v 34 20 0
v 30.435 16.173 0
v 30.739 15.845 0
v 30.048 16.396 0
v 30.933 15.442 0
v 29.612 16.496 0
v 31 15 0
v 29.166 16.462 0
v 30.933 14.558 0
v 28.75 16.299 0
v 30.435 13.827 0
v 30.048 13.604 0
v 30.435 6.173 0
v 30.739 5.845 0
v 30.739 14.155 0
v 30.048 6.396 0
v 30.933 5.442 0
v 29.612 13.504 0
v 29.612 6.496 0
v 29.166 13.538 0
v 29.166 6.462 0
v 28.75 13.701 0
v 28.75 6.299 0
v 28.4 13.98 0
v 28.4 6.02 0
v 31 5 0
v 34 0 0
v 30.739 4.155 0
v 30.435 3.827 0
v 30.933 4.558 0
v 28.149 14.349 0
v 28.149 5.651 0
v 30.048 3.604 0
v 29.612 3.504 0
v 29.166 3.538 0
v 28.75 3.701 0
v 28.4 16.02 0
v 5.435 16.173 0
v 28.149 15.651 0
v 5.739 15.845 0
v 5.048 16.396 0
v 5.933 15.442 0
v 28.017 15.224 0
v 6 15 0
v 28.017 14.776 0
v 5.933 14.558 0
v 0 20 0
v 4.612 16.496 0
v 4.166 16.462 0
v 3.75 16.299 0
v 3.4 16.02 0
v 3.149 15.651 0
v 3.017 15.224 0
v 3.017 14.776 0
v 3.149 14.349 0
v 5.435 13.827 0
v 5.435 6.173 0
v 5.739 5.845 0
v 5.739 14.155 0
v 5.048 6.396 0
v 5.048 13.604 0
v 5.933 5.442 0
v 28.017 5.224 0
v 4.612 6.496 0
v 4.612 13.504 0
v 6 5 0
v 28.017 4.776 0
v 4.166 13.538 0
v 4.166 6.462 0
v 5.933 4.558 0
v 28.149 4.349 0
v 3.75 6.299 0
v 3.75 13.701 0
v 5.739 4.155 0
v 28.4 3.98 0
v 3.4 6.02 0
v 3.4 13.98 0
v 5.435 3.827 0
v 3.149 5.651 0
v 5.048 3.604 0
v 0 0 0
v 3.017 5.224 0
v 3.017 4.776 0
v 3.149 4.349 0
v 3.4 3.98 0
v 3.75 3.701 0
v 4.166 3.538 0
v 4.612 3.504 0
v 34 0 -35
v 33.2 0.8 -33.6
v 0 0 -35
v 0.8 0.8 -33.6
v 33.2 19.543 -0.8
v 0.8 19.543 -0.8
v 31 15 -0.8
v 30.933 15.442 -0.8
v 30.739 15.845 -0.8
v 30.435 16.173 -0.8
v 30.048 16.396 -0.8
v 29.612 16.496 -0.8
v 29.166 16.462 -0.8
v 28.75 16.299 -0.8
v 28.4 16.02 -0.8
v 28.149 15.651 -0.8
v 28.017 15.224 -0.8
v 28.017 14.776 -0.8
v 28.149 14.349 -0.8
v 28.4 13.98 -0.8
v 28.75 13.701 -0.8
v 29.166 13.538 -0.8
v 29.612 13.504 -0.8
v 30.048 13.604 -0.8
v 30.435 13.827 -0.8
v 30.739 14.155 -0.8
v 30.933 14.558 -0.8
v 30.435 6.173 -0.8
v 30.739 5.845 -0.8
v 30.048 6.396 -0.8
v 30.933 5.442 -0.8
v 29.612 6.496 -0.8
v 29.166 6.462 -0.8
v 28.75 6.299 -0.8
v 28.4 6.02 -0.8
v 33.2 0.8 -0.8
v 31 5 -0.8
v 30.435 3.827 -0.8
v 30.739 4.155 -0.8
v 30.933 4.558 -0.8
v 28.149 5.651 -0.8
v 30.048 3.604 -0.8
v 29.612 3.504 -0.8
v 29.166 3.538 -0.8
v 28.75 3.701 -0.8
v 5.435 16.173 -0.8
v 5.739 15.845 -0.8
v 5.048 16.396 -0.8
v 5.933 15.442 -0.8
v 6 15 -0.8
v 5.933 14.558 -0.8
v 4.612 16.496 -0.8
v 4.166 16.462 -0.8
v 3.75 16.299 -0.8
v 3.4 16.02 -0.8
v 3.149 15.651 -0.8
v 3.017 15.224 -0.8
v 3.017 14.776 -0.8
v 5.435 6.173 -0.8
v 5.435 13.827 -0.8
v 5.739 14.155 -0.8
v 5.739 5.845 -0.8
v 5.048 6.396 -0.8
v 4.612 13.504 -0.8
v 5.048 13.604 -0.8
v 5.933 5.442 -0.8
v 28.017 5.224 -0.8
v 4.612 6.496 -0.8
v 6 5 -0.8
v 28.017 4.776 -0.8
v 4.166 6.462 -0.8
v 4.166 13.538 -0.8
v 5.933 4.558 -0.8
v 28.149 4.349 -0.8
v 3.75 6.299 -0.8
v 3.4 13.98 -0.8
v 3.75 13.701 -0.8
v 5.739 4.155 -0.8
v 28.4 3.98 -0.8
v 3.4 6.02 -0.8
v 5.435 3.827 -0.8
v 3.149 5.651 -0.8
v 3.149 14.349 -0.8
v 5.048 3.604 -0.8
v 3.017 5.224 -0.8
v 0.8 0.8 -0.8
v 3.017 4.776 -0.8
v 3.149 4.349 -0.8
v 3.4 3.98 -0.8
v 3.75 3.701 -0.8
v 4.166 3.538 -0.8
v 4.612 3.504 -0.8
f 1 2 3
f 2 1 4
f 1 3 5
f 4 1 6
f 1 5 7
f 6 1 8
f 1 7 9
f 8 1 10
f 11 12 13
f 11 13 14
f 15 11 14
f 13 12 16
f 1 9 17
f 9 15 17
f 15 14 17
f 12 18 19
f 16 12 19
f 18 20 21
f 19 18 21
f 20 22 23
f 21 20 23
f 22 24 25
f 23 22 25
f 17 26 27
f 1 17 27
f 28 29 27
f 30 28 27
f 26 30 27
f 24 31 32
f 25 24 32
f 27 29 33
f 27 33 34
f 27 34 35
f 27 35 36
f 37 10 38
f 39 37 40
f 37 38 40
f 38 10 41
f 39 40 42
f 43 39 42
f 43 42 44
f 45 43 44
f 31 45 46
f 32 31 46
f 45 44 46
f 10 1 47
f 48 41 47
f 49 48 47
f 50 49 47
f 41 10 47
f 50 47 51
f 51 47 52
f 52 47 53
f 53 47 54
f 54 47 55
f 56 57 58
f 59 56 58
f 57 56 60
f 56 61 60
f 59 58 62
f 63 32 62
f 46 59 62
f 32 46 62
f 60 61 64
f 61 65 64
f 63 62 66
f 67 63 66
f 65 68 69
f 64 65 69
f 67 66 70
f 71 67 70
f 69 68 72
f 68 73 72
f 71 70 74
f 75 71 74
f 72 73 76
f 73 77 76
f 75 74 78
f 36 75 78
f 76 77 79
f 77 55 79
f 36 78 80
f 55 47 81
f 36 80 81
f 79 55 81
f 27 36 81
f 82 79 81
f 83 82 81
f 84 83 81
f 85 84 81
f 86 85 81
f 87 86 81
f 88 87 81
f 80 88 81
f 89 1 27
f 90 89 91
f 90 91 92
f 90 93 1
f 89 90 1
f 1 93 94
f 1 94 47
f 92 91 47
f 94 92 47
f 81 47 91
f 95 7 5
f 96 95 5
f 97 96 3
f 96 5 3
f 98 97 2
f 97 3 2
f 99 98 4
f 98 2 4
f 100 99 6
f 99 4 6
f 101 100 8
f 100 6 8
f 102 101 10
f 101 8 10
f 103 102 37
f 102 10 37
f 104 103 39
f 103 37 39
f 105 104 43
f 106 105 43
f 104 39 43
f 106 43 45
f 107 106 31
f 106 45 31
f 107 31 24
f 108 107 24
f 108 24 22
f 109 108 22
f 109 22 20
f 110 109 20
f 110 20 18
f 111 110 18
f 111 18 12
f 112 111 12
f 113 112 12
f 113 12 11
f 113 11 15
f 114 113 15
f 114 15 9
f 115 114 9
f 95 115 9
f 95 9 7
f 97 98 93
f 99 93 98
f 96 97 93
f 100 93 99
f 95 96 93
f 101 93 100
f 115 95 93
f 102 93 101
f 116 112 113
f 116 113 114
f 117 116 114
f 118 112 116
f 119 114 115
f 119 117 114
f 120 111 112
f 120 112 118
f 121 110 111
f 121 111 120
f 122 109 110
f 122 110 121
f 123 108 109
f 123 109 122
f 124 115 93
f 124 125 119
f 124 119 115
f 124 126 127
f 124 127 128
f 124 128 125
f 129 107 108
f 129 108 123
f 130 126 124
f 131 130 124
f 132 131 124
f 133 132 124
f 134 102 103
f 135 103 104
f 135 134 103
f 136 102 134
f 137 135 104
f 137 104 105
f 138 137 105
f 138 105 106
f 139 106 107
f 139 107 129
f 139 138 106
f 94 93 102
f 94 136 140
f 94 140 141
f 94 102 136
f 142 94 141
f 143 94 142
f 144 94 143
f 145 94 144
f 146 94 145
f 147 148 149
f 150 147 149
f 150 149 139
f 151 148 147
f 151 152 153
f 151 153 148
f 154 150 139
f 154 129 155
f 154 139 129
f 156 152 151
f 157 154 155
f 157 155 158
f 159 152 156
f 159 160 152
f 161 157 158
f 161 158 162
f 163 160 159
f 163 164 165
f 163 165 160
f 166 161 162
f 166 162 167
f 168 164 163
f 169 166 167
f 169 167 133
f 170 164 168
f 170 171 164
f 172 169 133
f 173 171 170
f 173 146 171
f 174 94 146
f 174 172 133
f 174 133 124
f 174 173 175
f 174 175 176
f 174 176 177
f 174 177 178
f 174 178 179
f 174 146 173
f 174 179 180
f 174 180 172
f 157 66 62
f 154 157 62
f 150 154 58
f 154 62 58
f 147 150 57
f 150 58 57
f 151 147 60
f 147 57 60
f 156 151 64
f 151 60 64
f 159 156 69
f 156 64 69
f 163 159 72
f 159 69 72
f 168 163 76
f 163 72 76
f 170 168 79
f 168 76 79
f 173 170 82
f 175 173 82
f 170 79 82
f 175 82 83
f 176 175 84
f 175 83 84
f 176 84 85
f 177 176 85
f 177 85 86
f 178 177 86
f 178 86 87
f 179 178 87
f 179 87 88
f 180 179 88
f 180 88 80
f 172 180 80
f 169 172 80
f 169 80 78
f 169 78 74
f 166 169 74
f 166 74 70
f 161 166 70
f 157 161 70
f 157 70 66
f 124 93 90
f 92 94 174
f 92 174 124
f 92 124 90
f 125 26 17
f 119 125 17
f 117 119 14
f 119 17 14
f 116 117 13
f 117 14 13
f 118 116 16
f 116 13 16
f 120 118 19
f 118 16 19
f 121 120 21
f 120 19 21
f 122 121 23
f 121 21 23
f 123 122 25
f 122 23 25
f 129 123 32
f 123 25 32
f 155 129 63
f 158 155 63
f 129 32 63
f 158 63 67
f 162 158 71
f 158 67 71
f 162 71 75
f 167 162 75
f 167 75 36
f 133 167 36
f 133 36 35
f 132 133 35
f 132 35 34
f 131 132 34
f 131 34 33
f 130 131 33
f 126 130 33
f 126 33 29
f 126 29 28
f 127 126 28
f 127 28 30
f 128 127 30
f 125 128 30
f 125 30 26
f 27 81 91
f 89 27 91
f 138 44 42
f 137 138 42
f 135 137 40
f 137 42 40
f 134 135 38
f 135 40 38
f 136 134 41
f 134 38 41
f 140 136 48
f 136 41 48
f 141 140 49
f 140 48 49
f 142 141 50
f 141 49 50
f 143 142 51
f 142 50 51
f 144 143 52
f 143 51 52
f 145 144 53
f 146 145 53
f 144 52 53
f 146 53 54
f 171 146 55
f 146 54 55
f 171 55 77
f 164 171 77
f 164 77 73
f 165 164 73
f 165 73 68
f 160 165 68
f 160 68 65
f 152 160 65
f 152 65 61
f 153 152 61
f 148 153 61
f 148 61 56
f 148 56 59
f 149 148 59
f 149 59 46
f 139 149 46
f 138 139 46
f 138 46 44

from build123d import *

# Parameters (mm, degrees)
SALIENTE_EXTRUIR3_DEPTH = 34
VACIADO5_T              = -0.8
CROQUIS5_R              = 1.5
CORTAR_EXTRUIR1_DEPTH   = 3


with BuildPart() as part:
    # Croquis4 → Saliente-Extruir3 (new body)
    with BuildSketch(Plane(origin=(0, 0, 0), x_dir=(0, 0, -1), z_dir=(1, 0, 0))):
        Polygon((0, 0), (35, 0), (0, 20), align=None)
    extrude(amount=SALIENTE_EXTRUIR3_DEPTH)

    # Vaciado5
    vaciado5_openings = [part.faces().sort_by_distance(p)[0] for p in [
        (17, 10, -17.5),
    ]]
    offset(amount=VACIADO5_T, openings=vaciado5_openings, kind=Kind.INTERSECTION)

    # Croquis5 → Cortar-Extruir1 (cut)
    with BuildSketch(Plane.XY):
        with Locations((4.5, 15)):
            Circle(CROQUIS5_R)
        with Locations((29.5, 15)):
            Circle(CROQUIS5_R)
        with Locations((29.5, 5)):
            Circle(CROQUIS5_R)
        with Locations((4.5, 5)):
            Circle(CROQUIS5_R)
    extrude(amount=-CORTAR_EXTRUIR1_DEPTH, mode=Mode.SUBTRACT)


solid = part.part
